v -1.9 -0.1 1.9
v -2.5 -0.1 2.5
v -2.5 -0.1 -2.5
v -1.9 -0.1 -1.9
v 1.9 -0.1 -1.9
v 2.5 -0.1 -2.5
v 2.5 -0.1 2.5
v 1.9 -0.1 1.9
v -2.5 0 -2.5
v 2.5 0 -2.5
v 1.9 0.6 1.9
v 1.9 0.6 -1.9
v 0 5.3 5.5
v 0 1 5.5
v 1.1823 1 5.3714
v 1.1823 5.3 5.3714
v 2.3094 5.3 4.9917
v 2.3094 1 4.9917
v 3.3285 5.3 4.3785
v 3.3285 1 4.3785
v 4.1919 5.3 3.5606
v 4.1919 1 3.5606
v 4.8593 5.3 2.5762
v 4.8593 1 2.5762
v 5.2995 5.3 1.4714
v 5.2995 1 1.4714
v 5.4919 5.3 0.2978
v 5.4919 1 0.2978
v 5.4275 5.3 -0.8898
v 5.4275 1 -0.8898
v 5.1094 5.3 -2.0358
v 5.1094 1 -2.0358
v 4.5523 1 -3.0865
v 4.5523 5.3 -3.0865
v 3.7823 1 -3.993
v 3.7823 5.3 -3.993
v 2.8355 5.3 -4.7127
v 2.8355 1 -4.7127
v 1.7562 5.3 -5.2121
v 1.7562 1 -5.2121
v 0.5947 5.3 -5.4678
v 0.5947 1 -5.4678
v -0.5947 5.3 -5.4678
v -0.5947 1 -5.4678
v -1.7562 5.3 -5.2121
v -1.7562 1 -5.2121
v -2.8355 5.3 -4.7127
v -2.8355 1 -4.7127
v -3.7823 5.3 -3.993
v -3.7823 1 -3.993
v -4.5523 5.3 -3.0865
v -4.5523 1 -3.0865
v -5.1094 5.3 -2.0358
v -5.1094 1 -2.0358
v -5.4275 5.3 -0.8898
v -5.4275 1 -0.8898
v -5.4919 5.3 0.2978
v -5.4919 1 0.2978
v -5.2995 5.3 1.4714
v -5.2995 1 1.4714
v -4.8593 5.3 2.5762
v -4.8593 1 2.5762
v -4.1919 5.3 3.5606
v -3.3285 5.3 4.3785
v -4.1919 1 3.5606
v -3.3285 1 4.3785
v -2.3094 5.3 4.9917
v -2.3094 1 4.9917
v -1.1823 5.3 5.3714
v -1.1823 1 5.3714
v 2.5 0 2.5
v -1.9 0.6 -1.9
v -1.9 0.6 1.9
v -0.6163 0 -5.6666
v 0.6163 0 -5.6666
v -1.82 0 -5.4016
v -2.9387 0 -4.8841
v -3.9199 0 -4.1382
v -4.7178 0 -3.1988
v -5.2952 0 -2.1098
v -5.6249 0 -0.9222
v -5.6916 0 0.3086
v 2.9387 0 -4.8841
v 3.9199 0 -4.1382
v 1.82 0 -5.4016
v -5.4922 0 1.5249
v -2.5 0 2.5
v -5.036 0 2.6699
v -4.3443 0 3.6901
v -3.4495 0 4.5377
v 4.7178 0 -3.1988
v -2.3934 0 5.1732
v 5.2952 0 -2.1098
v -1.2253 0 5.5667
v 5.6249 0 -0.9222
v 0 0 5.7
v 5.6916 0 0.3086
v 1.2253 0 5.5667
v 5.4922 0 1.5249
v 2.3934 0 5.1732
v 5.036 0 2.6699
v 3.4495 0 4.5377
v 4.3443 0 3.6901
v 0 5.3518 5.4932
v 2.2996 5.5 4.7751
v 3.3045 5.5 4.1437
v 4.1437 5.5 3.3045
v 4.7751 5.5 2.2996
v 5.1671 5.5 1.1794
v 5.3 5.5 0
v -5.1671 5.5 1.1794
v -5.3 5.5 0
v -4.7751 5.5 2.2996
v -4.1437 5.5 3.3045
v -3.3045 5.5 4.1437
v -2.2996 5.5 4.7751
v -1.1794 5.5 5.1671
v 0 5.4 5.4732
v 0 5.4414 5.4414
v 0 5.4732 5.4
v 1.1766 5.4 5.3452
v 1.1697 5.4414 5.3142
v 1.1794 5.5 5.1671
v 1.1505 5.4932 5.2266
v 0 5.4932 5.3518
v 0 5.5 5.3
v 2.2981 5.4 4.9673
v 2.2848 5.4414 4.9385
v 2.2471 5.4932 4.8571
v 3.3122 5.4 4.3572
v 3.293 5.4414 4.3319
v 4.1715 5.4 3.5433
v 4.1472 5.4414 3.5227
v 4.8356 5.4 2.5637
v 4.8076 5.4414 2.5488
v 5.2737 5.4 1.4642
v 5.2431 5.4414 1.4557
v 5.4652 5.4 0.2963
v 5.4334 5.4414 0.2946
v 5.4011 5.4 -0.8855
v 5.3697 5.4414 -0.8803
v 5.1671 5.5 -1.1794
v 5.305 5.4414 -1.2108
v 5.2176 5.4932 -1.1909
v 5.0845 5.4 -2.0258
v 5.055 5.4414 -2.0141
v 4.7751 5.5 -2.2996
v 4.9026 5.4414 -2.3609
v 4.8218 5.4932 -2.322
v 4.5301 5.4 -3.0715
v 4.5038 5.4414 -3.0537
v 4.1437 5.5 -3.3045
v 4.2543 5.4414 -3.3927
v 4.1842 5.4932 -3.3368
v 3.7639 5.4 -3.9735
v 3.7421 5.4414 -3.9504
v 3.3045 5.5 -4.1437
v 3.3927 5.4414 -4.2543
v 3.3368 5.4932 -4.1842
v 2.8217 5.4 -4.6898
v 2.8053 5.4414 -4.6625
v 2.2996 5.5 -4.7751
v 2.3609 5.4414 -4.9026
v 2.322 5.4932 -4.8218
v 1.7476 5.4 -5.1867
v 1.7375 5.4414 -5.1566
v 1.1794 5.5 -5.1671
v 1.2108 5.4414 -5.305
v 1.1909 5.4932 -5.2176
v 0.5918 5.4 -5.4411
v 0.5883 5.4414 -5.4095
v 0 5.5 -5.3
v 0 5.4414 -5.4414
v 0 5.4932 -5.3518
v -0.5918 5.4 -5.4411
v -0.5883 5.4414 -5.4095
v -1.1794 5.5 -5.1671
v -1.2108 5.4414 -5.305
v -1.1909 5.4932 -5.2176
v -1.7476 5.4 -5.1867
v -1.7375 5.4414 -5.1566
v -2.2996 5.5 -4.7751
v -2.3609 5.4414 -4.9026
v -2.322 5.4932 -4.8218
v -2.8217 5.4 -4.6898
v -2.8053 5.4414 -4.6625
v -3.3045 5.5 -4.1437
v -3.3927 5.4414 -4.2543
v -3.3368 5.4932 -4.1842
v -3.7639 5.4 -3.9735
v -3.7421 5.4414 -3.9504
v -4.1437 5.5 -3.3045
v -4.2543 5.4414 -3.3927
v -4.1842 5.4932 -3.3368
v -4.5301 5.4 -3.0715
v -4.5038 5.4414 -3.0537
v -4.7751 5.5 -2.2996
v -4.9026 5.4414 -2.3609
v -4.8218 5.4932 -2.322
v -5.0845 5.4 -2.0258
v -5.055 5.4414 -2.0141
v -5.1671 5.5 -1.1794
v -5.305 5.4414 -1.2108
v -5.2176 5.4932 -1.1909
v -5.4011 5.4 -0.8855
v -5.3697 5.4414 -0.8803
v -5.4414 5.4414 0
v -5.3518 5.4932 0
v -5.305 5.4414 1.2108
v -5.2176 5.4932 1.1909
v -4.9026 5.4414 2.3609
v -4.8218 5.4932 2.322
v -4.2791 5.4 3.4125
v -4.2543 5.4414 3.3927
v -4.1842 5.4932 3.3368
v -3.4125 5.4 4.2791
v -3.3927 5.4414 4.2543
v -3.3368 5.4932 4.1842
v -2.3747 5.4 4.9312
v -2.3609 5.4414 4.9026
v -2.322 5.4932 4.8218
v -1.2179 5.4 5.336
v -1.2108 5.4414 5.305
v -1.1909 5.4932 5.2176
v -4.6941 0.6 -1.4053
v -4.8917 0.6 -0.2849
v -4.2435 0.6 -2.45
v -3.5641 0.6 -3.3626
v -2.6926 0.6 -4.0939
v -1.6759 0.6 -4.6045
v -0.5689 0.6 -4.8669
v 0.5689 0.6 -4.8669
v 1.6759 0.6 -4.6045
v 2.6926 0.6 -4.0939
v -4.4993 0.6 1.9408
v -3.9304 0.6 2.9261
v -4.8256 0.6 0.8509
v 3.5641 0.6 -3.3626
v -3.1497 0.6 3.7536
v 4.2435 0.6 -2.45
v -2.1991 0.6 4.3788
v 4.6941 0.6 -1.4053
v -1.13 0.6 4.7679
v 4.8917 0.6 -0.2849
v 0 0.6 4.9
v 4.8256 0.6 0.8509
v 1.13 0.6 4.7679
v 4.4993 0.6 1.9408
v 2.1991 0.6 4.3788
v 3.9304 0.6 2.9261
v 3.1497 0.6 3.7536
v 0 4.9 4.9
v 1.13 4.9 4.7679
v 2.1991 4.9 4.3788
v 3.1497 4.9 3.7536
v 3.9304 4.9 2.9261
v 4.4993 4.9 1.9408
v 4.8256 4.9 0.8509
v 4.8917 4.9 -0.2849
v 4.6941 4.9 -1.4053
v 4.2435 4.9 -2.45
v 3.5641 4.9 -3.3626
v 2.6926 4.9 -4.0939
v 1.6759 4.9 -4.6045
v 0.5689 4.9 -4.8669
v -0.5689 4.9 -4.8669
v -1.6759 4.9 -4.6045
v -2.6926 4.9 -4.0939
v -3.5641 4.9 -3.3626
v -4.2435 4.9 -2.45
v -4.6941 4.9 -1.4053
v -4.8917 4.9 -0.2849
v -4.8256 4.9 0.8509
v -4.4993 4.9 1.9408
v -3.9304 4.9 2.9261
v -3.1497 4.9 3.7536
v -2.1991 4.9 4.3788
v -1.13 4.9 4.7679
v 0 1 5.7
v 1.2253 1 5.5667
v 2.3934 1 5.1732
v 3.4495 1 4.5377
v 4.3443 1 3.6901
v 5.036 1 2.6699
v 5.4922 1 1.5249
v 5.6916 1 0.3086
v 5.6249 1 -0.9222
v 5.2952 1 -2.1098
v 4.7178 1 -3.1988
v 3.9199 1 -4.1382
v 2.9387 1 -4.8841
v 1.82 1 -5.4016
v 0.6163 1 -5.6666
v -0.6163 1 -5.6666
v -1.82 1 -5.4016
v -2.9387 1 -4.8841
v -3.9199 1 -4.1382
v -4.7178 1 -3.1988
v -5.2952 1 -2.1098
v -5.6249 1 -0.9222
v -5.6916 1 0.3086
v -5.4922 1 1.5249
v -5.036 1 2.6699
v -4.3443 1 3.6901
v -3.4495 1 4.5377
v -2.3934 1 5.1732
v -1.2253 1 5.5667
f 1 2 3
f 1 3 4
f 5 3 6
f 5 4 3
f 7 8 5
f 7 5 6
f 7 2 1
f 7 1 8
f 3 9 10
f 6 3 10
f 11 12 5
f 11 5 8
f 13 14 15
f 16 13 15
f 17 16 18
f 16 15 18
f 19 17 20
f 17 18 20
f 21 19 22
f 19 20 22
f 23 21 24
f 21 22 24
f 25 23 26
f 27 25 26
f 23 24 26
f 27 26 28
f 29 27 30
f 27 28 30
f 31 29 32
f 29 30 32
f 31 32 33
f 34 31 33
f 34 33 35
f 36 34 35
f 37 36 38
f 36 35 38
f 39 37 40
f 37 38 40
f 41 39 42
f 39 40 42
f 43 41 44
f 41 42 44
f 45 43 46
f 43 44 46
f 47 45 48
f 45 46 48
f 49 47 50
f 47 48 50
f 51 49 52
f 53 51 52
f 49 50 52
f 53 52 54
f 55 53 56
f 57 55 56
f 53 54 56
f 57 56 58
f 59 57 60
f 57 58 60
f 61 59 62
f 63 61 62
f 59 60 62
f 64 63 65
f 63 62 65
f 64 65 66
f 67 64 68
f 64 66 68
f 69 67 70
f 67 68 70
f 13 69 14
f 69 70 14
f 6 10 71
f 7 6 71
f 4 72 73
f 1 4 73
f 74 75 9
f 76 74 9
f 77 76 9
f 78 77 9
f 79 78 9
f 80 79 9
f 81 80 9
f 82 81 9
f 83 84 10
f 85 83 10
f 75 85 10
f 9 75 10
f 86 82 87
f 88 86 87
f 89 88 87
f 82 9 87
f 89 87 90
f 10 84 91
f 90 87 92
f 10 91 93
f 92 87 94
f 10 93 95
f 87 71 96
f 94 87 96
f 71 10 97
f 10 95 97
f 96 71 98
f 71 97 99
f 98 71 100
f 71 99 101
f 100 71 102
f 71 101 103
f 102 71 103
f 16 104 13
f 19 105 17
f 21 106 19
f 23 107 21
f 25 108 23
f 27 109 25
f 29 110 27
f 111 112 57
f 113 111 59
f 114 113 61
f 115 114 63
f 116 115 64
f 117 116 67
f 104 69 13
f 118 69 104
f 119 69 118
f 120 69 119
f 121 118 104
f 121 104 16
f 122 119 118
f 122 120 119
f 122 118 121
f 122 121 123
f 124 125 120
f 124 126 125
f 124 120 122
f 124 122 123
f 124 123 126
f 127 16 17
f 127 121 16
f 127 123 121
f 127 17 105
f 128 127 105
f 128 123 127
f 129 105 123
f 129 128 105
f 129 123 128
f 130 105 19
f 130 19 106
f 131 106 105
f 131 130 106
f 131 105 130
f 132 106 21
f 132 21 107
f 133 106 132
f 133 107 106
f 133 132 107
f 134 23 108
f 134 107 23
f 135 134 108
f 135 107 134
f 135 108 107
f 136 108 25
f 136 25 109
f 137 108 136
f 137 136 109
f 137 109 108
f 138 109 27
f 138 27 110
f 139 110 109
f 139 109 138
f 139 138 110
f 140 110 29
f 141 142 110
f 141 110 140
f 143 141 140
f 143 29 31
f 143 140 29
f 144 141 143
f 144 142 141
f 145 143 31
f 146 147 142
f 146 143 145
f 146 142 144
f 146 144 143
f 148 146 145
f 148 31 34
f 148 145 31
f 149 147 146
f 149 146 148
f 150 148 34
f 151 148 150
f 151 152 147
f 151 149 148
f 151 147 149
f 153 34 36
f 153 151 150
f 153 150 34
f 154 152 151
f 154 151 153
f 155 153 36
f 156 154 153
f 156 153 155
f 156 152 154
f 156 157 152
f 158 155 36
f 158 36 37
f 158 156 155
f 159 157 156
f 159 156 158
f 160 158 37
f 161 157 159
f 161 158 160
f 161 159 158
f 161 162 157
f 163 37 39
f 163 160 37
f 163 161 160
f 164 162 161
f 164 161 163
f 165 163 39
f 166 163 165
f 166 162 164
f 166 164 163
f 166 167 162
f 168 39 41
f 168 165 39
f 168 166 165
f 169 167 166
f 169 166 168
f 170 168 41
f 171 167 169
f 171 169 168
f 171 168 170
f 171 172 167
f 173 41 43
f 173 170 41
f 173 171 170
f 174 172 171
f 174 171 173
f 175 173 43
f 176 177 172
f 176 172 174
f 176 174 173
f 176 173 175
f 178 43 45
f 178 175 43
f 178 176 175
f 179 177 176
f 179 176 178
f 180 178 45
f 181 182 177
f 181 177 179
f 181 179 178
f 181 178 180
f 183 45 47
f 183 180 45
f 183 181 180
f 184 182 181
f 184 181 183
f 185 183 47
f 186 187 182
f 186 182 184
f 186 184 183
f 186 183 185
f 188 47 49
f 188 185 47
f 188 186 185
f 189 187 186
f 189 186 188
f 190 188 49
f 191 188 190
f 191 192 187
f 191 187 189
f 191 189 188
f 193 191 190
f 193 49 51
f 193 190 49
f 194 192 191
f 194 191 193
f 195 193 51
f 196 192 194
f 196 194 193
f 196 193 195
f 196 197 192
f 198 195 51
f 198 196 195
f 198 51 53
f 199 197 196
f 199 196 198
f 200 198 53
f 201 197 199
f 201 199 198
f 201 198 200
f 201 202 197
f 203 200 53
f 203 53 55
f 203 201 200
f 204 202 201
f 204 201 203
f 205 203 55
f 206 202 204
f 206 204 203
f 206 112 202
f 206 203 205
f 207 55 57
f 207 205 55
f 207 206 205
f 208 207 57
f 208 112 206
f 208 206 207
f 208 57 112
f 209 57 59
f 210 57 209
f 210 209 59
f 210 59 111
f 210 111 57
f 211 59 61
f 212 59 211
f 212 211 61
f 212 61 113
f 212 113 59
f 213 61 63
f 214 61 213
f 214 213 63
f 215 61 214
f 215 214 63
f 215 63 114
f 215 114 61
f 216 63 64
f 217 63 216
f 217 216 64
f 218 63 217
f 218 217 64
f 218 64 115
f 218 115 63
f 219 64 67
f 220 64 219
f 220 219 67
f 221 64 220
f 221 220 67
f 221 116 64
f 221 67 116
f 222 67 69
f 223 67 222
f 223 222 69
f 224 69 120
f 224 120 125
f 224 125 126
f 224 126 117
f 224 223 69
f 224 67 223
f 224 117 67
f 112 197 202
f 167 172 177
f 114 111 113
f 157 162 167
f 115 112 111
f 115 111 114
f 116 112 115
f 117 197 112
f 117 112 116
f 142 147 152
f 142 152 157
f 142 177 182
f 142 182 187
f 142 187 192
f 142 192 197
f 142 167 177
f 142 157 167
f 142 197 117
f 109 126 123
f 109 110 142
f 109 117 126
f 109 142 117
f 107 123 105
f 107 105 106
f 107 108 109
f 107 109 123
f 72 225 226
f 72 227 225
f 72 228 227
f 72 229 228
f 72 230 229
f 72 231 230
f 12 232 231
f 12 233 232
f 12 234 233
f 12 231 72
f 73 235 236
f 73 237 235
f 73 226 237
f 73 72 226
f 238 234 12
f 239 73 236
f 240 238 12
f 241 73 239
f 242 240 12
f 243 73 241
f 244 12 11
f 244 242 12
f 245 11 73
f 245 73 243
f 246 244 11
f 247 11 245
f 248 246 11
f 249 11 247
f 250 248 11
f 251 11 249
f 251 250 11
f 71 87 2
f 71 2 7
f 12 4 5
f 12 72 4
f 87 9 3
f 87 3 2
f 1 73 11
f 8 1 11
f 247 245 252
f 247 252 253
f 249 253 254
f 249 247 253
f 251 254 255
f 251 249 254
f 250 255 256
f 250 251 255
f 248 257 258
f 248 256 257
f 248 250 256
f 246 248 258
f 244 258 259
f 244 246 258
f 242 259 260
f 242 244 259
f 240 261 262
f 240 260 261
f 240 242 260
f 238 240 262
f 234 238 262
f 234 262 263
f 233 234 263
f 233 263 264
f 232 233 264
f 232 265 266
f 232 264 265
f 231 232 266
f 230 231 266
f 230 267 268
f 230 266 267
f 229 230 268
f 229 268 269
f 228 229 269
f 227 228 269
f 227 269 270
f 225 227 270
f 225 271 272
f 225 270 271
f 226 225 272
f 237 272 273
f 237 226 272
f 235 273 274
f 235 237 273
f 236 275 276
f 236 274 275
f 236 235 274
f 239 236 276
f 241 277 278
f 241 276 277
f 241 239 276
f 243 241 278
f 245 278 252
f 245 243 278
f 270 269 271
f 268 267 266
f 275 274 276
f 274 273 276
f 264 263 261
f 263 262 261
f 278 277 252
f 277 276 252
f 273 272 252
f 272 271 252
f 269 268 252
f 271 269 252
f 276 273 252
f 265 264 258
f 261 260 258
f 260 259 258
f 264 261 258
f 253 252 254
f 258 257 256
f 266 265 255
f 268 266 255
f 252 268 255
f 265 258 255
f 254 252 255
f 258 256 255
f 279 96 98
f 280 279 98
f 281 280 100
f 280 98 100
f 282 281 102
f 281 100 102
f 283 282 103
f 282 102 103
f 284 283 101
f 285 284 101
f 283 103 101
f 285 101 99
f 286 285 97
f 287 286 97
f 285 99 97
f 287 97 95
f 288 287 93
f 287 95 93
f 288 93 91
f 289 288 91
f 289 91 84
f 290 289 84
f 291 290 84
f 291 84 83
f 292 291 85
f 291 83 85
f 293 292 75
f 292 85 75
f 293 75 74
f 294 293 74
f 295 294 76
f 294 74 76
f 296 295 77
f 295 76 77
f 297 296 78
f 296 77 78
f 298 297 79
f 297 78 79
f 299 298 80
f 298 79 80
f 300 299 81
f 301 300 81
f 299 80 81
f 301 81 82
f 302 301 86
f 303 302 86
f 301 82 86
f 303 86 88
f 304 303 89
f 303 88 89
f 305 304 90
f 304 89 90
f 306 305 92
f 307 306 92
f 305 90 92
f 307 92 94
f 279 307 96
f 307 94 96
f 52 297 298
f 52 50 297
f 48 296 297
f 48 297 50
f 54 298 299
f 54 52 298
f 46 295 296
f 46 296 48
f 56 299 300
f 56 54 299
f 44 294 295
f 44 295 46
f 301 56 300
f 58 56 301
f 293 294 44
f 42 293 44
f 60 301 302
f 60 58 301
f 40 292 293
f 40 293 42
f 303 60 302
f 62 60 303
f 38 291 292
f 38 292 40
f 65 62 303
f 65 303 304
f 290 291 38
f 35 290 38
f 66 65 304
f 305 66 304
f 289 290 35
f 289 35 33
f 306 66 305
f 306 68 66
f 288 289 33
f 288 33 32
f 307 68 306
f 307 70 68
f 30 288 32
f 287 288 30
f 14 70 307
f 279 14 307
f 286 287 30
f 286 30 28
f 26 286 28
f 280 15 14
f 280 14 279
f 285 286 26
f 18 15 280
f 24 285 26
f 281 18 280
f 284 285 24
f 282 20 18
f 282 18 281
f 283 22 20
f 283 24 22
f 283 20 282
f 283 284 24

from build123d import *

# Parameters (mm, degrees)
SKETCH7_R           = 5.7
BOSS_EXTRUDE2_DEPTH = 1
SKETCH8_R           = 5.5
BOSS_EXTRUDE3_DEPTH = 4.5
FILLET4_R           = 0.2
SKETCH9_W           = 5
SKETCH9_H           = 5
BOSS_EXTRUDE4_DEPTH = 0.1
SHELL3_T            = -0.6


with BuildPart() as part:
    # Sketch7 → Boss-Extrude2 (new body)
    with BuildSketch(Plane(origin=(0, 0, 0), x_dir=(1, 0, 0), z_dir=(0, 1, 0))):
        with Locations(Location((0, 0, 0), (0, 0, 270))):
            Circle(SKETCH7_R)
    extrude(amount=BOSS_EXTRUDE2_DEPTH)

    # Sketch8 → Boss-Extrude3 (add)
    with BuildSketch(Plane(origin=(0, 1, 0), x_dir=(1, 0, 0), z_dir=(0, 1, 0))):
        with Locations(Location((0, 0, 0), (0, 0, 270))):
            Circle(SKETCH8_R)
    extrude(amount=BOSS_EXTRUDE3_DEPTH)

    # Fillet4
    fillet4_edges = [part.edges().sort_by_distance(p)[0] for p in [
        (0, 5.5, -5.5),
    ]]
    fillet(fillet4_edges, radius=FILLET4_R)

    # Sketch9 → Boss-Extrude4 (add)
    with BuildSketch(Plane.XZ):
        Rectangle(SKETCH9_W, SKETCH9_H)
    extrude(amount=BOSS_EXTRUDE4_DEPTH)

    # Shell3
    shell3_openings = [part.faces().sort_by_distance(p)[0] for p in [
        (0, -0.1, 0),
    ]]
    offset(amount=SHELL3_T, openings=shell3_openings, kind=Kind.INTERSECTION)


solid = part.part
